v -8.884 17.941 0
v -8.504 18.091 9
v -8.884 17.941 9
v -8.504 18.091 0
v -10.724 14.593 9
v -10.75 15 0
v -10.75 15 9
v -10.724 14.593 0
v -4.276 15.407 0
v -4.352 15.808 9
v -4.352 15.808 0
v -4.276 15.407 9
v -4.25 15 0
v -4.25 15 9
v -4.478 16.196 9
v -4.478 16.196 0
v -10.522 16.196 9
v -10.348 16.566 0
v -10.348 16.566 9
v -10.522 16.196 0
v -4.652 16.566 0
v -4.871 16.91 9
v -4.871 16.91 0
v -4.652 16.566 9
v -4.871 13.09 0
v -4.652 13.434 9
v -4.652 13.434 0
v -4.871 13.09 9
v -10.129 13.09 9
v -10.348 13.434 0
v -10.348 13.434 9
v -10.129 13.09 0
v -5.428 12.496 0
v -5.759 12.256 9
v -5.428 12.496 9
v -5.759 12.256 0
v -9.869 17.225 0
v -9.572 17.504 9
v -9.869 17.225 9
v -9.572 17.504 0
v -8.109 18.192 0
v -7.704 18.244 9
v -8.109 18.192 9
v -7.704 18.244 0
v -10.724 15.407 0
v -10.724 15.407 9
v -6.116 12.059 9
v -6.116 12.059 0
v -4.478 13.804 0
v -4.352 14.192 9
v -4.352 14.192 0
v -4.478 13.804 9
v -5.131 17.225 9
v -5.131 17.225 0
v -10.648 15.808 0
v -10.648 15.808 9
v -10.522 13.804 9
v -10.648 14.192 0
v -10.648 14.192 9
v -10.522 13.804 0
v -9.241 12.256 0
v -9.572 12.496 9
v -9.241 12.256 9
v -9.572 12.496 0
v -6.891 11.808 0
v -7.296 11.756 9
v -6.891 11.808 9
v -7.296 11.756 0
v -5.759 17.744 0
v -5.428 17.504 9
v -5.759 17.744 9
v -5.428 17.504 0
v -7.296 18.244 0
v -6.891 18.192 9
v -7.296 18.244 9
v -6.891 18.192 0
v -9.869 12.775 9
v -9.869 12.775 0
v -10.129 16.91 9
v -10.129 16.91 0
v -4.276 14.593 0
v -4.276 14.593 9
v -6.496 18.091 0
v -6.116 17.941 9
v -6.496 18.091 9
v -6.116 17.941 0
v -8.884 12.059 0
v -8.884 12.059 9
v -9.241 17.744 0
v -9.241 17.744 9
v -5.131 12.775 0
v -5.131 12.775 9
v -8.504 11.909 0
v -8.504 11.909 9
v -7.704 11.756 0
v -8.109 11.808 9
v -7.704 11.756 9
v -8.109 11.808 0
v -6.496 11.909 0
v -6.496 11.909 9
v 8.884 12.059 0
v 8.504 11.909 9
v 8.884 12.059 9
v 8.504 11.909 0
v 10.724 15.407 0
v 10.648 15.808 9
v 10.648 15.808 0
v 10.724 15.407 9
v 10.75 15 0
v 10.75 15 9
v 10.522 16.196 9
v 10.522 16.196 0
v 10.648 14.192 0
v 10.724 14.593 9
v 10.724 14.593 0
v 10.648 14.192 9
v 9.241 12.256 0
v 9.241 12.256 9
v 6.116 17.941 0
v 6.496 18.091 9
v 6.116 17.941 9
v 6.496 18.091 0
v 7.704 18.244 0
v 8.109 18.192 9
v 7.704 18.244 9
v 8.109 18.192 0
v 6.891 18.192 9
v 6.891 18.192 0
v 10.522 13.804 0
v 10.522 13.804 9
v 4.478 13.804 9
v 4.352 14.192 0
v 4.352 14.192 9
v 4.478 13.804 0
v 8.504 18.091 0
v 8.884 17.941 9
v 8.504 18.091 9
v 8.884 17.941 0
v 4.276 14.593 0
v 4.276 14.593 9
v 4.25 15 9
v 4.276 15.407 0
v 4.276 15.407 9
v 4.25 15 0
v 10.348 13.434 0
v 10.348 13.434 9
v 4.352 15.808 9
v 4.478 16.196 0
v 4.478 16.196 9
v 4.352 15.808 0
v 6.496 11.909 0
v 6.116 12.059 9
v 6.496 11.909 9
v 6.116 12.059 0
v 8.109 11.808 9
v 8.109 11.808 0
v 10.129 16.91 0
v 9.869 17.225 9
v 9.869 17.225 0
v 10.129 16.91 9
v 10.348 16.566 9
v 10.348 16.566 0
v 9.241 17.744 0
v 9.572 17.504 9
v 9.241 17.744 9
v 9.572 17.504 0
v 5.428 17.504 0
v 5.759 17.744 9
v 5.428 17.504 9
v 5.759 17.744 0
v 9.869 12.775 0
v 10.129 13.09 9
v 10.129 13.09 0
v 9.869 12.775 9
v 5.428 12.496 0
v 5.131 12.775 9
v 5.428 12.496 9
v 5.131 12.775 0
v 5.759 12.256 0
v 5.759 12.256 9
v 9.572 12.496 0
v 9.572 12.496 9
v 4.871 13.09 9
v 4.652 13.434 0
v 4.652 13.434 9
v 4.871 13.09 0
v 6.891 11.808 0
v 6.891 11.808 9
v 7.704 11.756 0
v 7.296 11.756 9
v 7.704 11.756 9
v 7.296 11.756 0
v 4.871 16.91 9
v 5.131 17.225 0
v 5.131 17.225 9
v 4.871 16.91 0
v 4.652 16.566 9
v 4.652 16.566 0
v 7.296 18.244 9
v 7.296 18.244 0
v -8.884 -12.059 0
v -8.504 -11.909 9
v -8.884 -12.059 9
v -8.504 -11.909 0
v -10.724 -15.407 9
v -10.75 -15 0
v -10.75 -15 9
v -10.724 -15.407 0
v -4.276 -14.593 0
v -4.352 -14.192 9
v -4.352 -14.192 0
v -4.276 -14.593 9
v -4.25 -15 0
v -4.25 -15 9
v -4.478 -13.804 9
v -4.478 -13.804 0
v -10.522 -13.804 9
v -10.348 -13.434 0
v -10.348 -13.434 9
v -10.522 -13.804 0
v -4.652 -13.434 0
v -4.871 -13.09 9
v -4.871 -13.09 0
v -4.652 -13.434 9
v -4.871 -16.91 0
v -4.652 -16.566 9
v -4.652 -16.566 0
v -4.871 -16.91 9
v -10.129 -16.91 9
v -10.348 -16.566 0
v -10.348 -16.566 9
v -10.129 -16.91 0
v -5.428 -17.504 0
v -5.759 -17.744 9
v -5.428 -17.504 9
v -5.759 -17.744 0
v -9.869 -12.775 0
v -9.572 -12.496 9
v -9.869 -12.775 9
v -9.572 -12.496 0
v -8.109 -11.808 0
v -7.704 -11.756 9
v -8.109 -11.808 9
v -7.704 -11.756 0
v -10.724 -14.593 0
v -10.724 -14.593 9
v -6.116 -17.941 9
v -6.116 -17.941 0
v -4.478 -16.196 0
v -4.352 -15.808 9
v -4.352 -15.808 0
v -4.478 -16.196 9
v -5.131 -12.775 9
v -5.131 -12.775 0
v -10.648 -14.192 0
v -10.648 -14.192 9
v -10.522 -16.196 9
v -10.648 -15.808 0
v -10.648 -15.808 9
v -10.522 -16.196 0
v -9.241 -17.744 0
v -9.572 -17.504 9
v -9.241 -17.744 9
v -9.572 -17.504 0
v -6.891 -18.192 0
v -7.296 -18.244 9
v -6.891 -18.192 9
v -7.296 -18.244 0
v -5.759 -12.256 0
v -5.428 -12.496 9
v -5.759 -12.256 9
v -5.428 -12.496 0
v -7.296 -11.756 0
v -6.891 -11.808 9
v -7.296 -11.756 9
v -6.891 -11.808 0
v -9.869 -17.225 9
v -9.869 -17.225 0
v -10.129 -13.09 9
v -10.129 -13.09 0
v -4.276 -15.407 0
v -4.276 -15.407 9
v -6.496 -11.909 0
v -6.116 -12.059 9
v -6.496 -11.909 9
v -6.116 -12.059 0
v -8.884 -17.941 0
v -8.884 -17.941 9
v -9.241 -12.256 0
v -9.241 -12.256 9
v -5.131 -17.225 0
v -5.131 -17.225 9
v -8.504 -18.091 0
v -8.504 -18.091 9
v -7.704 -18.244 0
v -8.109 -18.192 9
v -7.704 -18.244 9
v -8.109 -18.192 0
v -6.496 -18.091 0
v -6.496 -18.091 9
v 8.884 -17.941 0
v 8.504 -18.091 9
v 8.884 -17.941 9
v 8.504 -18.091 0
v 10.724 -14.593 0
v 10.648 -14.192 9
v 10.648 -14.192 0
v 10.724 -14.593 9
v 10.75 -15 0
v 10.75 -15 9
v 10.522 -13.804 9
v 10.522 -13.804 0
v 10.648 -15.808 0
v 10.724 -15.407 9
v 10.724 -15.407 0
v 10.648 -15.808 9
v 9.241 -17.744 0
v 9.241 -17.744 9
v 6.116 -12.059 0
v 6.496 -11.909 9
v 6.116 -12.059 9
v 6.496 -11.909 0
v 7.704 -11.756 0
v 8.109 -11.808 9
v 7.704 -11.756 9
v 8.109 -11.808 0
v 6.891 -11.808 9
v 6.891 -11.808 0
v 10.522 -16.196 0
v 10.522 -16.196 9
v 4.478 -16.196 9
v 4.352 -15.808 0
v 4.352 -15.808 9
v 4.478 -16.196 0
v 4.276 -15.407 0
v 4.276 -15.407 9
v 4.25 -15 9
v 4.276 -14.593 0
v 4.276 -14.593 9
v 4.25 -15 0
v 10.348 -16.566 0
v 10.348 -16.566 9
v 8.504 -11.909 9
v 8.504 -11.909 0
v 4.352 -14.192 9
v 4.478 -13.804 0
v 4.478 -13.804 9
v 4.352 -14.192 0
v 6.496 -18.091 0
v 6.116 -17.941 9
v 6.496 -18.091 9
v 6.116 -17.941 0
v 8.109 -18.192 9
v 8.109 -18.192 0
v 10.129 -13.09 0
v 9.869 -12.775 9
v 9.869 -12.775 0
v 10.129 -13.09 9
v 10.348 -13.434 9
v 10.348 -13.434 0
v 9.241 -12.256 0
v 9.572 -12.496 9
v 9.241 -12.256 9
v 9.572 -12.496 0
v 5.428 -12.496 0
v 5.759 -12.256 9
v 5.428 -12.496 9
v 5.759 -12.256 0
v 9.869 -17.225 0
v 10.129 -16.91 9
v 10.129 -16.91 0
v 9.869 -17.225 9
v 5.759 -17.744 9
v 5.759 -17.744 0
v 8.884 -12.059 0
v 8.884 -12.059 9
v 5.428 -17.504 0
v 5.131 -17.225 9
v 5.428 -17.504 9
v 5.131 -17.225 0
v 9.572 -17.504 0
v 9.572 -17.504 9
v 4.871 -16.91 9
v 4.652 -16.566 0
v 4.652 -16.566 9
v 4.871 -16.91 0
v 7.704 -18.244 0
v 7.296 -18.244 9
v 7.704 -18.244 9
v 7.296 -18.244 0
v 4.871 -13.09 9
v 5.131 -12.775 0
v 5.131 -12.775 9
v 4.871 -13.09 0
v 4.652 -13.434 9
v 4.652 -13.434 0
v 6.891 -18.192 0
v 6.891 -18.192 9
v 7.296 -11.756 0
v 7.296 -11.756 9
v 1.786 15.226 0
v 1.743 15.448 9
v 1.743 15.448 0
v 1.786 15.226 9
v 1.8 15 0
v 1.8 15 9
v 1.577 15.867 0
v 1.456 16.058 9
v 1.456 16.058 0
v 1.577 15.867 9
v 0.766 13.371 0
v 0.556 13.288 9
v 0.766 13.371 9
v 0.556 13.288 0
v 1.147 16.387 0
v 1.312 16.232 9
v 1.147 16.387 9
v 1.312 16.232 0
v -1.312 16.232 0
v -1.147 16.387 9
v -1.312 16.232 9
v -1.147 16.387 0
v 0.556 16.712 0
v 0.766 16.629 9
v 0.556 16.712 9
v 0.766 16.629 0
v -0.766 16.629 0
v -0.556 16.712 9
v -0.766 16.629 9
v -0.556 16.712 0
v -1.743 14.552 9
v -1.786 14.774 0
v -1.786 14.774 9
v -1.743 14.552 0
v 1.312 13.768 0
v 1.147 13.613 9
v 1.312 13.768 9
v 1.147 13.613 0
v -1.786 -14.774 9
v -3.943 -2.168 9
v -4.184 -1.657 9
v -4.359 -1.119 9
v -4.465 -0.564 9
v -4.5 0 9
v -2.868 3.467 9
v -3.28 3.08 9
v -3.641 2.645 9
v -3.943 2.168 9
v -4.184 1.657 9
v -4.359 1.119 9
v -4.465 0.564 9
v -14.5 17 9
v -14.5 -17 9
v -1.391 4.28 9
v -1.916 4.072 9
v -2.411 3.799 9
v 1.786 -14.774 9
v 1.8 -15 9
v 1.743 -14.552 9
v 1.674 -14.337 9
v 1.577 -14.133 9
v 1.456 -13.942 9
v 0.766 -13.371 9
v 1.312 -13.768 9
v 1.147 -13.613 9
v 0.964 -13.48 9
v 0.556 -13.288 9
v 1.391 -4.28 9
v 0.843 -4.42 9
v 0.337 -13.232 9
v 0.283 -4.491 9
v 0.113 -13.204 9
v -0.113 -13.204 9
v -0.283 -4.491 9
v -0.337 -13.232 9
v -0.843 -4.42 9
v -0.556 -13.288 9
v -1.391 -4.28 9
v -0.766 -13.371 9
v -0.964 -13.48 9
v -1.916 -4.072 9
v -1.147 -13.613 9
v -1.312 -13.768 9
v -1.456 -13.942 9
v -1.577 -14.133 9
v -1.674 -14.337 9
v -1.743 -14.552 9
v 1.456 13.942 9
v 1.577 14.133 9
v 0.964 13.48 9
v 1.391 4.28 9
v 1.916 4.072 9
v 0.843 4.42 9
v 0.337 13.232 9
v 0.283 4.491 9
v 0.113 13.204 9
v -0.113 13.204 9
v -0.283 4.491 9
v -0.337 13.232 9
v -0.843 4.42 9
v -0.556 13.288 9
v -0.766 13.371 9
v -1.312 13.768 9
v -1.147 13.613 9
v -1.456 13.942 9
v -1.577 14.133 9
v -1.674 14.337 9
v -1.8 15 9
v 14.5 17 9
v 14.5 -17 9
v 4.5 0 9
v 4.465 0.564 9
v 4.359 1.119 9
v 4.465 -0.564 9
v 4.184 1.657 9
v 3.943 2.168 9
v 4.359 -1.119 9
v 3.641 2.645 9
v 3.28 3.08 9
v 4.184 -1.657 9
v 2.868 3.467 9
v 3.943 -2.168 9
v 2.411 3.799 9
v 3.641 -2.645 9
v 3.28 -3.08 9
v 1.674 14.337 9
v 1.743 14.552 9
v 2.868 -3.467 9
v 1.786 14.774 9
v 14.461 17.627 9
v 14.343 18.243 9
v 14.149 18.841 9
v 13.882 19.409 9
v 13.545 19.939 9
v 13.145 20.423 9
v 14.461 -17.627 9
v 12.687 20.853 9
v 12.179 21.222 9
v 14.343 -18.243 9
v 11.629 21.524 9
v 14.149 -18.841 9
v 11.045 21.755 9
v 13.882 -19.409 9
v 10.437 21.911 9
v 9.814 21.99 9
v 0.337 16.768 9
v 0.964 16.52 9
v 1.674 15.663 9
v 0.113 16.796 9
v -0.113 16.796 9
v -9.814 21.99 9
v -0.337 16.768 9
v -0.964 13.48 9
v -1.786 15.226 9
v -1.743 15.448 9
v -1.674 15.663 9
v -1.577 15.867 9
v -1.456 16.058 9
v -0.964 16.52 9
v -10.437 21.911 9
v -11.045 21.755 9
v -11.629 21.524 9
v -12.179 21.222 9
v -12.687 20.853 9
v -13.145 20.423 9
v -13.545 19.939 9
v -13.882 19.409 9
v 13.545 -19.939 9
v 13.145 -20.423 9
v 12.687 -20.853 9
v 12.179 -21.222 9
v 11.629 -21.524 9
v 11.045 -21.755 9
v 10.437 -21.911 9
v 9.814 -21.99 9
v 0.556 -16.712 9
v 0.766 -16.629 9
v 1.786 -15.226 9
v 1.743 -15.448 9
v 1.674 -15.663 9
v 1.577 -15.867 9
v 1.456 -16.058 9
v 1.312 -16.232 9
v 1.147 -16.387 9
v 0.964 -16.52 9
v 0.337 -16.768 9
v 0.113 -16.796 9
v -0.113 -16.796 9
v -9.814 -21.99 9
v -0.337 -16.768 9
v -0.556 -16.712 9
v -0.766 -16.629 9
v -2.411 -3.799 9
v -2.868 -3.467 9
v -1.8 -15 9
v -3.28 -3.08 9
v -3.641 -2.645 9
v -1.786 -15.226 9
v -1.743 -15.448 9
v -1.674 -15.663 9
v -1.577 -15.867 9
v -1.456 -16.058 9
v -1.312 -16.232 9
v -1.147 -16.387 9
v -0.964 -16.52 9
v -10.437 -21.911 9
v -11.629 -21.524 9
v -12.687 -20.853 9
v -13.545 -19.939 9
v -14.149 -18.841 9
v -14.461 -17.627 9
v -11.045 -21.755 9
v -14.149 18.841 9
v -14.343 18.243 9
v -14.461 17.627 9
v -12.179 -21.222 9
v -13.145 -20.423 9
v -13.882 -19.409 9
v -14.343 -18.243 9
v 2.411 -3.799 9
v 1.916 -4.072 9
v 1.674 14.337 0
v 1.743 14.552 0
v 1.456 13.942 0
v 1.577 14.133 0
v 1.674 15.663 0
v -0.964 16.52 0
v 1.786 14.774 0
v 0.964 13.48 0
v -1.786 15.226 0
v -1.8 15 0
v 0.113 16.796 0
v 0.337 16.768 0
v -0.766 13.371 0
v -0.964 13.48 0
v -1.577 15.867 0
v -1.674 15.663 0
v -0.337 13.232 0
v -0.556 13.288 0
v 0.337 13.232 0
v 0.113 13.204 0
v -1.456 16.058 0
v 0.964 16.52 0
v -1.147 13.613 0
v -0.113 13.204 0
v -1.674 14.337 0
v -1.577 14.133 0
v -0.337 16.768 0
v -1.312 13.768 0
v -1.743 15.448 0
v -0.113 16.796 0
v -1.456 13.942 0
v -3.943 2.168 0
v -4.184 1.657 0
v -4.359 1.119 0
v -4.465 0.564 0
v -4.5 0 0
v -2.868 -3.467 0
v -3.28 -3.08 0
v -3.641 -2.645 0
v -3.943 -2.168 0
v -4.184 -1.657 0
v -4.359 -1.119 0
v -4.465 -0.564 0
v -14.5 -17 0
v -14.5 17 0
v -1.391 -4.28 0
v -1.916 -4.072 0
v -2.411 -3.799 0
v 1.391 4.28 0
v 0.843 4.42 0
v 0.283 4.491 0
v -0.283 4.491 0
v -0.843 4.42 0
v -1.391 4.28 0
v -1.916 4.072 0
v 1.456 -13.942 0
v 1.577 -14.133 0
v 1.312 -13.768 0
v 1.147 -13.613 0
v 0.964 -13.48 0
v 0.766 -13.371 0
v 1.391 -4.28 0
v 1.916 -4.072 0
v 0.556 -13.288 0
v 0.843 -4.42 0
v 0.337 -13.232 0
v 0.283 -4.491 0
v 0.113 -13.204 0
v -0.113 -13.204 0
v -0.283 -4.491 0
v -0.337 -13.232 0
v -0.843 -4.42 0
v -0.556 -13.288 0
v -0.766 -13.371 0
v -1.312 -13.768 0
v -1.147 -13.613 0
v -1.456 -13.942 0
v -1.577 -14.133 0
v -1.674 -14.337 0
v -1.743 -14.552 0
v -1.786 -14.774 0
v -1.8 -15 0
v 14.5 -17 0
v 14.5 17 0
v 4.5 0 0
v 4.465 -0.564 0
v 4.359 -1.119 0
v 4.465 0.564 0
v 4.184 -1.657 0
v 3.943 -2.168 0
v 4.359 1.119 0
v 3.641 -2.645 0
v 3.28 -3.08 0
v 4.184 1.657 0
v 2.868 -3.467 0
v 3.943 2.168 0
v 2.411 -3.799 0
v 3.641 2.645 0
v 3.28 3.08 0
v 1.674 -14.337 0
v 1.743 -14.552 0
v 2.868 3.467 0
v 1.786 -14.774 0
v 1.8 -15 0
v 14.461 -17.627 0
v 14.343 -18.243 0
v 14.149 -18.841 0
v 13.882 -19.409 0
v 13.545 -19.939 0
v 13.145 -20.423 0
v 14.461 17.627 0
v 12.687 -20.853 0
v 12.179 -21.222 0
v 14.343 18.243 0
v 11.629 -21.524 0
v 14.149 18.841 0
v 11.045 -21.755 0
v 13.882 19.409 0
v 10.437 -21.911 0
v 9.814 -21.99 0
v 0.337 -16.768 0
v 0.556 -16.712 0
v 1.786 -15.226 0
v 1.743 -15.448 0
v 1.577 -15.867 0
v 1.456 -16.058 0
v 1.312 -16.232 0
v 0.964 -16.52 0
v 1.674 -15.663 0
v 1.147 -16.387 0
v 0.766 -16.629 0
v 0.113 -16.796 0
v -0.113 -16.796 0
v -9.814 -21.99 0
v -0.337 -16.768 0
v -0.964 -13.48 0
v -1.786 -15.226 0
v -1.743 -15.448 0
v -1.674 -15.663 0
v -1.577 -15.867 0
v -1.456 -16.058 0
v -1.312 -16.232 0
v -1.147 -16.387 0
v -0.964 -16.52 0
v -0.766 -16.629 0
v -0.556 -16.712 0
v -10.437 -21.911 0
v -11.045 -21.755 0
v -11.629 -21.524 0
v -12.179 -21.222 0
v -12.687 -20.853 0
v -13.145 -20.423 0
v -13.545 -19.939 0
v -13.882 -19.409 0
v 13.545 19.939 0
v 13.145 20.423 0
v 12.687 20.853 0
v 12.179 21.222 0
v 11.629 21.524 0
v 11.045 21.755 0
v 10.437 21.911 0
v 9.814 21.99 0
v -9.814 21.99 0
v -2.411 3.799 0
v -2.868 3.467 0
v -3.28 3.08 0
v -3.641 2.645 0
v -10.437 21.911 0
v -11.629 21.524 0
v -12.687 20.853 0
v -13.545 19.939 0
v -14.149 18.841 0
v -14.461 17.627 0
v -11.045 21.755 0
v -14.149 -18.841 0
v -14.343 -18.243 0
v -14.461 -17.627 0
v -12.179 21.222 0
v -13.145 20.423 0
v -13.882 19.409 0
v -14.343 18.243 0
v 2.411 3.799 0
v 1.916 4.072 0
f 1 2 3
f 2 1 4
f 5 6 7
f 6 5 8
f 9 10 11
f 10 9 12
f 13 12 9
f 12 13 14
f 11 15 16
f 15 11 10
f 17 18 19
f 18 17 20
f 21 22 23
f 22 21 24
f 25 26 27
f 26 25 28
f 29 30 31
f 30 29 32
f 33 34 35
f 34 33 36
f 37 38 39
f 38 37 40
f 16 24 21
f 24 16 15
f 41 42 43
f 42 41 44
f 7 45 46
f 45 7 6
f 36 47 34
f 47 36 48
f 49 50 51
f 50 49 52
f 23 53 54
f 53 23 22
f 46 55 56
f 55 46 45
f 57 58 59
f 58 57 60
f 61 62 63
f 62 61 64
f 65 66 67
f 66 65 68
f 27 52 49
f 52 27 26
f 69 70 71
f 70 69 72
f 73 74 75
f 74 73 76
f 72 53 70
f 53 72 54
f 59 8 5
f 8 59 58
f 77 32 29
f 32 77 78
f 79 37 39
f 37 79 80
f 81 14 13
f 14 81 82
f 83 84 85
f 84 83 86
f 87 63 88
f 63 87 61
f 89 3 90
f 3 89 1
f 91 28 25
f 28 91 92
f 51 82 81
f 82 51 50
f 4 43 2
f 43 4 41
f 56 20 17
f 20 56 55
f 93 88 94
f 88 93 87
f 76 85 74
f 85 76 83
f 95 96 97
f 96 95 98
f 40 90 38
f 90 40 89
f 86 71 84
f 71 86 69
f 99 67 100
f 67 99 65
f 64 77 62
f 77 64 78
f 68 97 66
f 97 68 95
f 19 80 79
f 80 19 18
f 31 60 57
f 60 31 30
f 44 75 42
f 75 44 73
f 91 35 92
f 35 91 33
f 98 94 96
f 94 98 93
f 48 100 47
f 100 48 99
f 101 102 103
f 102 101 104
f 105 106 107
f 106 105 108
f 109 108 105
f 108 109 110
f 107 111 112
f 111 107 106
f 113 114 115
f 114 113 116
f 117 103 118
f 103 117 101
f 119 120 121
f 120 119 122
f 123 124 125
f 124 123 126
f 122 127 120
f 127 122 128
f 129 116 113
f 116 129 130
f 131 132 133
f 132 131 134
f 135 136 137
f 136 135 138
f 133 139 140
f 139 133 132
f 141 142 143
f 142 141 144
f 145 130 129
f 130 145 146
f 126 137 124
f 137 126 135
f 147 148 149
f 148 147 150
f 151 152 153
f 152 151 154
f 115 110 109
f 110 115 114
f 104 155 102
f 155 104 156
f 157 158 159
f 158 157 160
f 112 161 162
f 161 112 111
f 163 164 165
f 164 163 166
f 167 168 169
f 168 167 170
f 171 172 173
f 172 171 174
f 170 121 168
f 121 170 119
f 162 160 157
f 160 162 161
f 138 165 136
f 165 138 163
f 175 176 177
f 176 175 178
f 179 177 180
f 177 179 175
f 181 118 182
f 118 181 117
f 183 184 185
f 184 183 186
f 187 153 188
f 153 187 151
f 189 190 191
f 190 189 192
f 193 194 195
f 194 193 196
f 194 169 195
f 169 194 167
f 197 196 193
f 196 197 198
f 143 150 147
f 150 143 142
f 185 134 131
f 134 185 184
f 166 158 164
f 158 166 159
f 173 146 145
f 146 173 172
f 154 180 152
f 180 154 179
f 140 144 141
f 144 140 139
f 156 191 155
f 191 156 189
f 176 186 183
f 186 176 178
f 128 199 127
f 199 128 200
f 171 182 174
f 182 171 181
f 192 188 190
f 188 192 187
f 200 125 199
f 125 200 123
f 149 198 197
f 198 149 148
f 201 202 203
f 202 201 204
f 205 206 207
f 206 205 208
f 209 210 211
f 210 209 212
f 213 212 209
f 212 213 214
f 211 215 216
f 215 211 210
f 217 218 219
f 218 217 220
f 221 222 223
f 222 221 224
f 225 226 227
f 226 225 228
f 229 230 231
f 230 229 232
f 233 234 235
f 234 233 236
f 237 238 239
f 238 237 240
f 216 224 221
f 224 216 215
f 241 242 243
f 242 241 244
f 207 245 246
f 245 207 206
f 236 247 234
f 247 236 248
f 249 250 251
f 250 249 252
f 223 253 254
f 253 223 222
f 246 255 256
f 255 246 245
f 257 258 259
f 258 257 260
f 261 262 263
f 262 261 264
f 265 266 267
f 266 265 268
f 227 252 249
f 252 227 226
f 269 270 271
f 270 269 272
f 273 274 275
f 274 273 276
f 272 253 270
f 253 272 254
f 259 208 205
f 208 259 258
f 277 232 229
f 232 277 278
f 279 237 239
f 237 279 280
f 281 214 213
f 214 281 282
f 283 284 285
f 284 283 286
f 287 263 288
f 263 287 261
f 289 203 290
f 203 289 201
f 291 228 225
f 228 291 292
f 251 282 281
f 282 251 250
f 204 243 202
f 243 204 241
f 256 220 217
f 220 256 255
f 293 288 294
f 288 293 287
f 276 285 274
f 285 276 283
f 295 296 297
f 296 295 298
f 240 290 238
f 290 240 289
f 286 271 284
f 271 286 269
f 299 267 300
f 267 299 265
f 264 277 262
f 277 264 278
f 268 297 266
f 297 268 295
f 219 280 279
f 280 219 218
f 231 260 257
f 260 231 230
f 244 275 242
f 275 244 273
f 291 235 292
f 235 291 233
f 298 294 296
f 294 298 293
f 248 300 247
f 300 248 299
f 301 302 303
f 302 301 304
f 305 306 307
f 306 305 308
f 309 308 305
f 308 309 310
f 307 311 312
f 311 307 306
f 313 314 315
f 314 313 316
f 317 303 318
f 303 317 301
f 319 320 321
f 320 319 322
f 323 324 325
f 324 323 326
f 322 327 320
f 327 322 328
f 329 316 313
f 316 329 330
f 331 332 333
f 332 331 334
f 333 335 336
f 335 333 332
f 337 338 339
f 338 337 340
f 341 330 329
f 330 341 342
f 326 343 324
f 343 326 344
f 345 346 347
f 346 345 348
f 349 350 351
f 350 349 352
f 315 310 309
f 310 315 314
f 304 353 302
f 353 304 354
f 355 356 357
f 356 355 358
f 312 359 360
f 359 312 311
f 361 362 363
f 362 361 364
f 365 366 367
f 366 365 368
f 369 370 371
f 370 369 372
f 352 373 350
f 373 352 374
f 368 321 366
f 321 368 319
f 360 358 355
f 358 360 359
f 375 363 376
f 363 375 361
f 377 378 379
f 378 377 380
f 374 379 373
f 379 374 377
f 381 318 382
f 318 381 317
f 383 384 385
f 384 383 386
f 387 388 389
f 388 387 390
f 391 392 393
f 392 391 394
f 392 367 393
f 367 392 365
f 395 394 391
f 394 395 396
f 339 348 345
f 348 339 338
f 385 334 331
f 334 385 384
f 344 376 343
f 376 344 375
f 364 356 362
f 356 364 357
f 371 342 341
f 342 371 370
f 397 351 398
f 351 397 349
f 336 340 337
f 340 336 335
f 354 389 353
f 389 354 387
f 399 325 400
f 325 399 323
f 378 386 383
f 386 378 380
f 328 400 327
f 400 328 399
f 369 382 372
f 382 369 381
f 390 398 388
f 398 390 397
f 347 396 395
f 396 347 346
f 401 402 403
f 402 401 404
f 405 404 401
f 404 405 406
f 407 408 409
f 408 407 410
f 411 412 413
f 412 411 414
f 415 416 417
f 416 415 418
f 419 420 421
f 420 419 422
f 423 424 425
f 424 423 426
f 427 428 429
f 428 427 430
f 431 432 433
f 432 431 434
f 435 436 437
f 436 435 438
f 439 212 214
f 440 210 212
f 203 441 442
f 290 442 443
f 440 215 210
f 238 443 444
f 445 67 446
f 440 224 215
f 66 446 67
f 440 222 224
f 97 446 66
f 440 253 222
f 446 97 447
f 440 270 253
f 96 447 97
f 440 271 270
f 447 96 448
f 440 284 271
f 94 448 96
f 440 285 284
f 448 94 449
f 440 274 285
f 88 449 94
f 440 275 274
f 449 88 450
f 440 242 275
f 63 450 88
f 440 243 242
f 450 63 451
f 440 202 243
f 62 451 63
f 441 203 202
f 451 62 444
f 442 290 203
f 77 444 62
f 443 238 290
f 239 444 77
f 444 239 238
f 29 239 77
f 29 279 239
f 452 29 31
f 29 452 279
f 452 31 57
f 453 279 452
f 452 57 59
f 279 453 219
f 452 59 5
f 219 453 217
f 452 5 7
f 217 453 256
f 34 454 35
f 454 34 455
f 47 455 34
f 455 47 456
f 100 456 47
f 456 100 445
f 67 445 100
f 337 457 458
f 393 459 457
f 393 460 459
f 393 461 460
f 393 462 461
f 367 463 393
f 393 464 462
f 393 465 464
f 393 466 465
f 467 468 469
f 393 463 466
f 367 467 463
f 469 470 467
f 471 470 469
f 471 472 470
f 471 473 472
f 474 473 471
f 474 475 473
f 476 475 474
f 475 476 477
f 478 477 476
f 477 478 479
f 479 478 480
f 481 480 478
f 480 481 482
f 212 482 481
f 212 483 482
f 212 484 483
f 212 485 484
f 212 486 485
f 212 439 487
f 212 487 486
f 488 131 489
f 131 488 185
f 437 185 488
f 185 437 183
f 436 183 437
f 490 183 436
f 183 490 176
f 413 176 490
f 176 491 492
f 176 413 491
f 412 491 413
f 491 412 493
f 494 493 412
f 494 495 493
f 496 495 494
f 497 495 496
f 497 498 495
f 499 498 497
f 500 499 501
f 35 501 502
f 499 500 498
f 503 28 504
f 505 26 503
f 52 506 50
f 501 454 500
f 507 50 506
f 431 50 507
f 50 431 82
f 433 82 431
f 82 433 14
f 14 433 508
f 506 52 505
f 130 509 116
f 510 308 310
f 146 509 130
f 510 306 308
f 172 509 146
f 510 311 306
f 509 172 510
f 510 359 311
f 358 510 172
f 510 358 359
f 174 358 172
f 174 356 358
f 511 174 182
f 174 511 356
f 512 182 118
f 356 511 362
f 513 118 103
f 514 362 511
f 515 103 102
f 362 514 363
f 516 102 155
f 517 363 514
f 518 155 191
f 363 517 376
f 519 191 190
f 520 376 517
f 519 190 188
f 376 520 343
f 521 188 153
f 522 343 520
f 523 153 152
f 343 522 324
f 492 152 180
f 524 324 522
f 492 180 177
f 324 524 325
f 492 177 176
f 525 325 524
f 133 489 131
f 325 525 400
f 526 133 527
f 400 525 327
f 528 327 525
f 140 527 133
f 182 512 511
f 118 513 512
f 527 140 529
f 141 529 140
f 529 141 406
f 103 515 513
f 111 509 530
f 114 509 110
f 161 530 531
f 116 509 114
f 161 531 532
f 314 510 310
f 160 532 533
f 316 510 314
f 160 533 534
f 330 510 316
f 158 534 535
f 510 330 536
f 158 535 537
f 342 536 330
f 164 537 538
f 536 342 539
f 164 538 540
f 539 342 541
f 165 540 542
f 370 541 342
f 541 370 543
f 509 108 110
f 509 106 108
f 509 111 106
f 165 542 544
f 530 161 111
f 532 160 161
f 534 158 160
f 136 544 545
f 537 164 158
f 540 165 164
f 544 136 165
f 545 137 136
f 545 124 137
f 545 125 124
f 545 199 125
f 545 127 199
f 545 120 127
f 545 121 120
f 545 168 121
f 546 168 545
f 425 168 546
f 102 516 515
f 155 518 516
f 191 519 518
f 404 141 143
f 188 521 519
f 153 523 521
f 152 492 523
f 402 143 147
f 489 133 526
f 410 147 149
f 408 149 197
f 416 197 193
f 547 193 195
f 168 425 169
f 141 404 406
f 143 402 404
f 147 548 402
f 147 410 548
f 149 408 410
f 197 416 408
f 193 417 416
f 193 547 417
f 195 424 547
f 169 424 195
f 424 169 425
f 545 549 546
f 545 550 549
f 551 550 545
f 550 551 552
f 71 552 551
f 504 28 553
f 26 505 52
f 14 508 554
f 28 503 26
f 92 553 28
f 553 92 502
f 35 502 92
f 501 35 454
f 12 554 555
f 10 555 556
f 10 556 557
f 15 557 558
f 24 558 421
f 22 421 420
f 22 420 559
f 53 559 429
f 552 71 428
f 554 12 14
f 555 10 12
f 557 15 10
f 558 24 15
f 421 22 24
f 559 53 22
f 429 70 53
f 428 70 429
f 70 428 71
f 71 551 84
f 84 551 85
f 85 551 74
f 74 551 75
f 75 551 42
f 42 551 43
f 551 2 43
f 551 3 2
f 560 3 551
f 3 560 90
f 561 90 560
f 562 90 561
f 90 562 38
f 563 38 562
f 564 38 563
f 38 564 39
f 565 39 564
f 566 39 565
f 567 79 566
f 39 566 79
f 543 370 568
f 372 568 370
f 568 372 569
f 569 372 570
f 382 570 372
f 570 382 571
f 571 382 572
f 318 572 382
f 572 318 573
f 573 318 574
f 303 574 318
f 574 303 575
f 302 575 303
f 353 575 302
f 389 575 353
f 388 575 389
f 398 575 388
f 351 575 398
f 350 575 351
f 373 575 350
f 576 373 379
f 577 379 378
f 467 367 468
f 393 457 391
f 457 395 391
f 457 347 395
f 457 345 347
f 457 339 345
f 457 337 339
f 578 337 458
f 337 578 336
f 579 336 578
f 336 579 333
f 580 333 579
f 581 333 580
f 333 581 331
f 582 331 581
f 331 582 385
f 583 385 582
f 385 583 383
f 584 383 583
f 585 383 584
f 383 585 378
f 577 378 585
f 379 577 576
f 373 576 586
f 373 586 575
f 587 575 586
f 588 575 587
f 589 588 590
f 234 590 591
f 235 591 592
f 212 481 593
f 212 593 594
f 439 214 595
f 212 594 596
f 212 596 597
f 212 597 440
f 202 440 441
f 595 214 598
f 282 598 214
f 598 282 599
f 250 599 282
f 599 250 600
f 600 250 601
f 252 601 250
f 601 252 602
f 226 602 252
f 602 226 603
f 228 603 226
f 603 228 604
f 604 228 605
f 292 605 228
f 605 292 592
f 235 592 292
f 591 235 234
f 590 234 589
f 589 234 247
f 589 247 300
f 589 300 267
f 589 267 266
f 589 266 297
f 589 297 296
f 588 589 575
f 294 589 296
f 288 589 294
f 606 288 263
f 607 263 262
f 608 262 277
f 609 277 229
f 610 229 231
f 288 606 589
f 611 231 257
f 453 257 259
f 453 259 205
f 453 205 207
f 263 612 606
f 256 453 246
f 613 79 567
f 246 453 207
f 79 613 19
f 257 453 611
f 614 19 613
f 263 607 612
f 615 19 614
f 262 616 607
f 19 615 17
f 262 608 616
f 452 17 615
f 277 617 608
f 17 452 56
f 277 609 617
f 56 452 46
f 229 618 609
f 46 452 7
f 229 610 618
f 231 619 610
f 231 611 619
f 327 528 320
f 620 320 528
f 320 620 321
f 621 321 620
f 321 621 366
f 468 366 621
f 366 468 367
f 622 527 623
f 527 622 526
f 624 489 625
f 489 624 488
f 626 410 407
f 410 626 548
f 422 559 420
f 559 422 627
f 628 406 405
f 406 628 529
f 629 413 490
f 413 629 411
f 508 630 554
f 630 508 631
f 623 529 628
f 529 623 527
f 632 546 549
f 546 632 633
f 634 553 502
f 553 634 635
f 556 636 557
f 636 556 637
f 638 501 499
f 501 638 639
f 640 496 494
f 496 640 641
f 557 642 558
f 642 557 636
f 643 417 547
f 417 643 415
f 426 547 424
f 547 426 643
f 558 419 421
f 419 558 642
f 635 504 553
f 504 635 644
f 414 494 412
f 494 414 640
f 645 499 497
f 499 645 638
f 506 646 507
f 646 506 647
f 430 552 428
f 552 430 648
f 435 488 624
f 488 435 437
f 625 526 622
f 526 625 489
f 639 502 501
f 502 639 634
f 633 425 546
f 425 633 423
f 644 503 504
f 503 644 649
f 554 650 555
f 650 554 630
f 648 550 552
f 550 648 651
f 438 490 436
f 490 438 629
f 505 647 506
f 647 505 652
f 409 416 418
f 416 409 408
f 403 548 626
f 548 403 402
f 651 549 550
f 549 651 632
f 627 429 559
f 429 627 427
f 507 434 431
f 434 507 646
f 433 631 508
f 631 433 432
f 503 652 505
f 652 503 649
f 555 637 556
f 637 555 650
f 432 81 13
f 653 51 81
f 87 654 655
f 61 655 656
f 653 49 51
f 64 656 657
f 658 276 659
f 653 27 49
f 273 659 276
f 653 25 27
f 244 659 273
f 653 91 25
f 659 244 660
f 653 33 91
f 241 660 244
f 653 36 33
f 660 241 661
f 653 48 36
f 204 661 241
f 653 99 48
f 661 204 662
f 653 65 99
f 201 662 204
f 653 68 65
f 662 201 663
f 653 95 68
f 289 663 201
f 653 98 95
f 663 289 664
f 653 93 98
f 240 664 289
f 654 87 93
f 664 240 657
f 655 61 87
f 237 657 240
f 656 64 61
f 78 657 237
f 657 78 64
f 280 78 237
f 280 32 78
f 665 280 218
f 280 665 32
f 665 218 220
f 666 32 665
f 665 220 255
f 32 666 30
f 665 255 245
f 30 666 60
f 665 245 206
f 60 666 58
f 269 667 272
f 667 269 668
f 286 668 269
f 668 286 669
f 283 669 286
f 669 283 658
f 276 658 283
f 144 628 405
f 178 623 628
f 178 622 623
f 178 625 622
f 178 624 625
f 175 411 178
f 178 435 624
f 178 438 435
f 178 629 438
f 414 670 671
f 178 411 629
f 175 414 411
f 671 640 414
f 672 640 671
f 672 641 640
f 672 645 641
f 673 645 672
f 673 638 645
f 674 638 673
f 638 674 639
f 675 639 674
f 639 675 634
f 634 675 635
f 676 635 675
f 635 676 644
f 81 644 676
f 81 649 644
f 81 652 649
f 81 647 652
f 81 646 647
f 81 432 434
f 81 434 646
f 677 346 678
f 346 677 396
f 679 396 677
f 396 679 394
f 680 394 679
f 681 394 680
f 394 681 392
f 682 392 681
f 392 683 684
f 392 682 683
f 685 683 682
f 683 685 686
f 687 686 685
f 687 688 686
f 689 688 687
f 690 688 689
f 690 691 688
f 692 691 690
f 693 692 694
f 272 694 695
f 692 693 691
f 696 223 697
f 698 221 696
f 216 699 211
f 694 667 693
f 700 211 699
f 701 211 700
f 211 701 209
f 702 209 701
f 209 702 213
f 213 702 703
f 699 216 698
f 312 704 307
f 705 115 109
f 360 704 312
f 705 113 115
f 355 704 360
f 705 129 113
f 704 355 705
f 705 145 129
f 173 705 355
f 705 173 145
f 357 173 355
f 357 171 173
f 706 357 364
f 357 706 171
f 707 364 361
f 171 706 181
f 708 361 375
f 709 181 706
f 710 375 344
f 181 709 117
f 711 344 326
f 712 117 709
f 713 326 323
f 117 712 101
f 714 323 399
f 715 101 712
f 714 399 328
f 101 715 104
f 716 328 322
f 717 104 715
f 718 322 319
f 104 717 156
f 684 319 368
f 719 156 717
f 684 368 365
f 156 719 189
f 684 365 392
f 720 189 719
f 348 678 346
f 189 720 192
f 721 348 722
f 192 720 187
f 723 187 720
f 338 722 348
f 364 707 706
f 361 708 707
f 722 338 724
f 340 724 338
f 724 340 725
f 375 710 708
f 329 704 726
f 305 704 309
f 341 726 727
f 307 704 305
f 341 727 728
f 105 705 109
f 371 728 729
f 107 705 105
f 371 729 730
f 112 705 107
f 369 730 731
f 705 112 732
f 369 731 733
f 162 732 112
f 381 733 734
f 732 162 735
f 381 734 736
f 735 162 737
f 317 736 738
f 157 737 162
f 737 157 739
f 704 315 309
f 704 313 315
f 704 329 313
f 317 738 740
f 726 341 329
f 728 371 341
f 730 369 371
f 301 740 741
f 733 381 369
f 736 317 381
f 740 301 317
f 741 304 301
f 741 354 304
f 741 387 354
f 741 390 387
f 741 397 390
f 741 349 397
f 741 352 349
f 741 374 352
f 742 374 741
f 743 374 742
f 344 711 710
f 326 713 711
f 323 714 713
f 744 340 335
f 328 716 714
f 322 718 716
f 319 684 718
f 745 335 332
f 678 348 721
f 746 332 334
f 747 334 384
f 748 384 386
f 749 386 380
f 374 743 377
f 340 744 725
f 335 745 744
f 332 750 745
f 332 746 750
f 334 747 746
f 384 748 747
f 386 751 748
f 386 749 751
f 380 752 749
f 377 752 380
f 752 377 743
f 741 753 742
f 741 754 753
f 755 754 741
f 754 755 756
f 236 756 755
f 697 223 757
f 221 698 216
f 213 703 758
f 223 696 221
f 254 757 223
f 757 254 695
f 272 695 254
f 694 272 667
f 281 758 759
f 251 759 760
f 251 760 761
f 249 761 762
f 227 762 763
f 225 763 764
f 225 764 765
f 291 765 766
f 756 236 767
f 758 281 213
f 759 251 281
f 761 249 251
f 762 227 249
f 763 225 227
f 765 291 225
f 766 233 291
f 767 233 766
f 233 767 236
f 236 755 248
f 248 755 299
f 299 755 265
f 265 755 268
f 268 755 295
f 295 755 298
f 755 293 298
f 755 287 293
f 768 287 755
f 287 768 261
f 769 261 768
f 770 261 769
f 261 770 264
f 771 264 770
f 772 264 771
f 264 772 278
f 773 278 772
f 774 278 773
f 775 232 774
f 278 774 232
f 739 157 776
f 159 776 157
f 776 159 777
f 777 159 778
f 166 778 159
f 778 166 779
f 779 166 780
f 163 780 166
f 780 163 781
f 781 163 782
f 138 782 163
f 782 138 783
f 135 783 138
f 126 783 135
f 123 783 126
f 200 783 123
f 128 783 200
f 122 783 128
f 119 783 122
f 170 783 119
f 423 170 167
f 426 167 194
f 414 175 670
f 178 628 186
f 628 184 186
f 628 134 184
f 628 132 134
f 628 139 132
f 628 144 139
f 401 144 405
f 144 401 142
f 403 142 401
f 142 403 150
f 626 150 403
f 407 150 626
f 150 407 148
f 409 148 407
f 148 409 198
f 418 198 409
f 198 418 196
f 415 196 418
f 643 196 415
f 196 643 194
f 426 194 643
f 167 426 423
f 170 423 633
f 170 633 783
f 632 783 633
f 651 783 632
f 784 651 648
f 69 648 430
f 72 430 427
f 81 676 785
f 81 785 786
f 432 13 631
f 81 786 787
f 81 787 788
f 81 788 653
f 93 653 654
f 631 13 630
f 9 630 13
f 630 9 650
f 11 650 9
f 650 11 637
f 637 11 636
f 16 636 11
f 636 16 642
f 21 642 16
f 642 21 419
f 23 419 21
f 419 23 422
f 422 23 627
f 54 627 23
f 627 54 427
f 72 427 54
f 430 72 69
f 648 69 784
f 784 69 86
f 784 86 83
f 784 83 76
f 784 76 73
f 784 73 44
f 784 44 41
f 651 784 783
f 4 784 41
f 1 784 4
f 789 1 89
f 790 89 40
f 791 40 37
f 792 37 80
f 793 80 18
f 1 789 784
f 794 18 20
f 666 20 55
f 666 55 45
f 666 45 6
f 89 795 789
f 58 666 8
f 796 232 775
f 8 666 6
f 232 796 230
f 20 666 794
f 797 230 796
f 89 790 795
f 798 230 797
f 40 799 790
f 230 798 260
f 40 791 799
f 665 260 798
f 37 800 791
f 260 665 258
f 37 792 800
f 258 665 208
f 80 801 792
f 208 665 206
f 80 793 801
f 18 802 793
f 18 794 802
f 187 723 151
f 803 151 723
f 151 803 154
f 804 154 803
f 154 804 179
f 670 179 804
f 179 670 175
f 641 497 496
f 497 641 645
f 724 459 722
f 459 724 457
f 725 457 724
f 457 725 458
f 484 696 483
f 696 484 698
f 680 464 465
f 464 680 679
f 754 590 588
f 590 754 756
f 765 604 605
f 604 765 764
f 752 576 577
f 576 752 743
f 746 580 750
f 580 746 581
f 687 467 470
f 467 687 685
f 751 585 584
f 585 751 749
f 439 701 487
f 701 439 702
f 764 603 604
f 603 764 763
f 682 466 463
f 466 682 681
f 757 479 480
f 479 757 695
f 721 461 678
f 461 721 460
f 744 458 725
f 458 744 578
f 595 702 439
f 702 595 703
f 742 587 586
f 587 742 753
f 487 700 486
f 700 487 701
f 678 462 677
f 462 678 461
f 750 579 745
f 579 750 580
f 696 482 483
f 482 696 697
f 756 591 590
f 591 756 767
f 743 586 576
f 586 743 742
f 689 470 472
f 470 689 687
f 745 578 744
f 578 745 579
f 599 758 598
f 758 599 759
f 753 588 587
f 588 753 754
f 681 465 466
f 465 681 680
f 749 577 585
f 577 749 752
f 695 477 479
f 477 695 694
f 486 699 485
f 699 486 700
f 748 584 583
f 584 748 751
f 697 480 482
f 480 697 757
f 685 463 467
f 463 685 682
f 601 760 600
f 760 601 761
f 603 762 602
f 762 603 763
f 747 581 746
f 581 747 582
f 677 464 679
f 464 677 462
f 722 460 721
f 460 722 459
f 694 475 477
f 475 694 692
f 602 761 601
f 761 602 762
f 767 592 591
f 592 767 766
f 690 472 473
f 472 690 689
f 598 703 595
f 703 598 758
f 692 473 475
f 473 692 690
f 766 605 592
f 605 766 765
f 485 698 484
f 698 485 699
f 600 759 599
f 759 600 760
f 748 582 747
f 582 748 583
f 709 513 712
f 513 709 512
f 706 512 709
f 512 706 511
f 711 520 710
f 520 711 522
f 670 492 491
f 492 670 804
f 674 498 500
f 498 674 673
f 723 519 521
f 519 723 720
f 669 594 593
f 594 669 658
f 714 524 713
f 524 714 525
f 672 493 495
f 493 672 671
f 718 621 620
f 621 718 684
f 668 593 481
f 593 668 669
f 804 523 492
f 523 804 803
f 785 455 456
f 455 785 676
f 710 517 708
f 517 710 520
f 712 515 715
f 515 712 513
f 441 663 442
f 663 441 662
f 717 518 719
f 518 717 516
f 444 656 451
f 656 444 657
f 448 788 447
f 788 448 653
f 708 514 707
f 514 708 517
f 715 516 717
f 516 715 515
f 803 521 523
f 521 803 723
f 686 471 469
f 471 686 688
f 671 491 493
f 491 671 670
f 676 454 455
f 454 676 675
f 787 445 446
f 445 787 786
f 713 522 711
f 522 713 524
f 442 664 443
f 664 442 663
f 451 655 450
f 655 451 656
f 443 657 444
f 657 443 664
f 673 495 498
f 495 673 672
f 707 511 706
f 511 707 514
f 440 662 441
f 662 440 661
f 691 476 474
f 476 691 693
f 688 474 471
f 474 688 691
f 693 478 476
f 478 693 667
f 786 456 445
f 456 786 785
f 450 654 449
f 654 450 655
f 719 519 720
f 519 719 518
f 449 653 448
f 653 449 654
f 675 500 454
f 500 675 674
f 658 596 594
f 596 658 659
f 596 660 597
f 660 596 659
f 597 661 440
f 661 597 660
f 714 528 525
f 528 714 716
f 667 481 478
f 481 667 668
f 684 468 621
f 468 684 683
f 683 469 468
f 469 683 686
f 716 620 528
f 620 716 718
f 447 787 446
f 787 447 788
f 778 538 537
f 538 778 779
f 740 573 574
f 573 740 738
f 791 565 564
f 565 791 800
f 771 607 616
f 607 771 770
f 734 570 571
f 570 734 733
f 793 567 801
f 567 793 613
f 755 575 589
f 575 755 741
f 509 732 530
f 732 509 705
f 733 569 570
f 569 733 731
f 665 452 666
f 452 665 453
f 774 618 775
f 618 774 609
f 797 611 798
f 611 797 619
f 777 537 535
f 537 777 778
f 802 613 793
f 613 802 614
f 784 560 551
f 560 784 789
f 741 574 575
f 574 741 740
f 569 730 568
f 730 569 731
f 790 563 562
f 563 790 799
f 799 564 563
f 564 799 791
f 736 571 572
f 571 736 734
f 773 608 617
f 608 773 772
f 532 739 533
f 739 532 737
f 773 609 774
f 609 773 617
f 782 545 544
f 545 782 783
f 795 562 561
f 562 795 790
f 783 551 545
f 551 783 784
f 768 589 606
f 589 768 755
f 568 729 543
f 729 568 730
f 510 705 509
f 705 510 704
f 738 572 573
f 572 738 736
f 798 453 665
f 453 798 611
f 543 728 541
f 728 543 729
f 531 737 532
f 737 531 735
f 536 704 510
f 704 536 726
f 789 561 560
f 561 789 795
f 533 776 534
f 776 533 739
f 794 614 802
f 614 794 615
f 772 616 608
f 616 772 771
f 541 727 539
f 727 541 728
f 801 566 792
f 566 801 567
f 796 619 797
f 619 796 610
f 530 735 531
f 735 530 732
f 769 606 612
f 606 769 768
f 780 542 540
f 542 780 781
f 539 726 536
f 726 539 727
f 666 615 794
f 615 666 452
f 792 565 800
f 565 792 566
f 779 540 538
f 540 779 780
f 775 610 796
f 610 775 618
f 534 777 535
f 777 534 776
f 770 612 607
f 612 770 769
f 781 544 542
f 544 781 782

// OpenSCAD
$fn = 50;


difference() {
	union() {
		hull() {
			translate(v = [-9.5000000000, 17.0000000000, 0]) {
				cylinder(h = 9, r = 5);
			}
			translate(v = [9.5000000000, 17.0000000000, 0]) {
				cylinder(h = 9, r = 5);
			}
			translate(v = [-9.5000000000, -17.0000000000, 0]) {
				cylinder(h = 9, r = 5);
			}
			translate(v = [9.5000000000, -17.0000000000, 0]) {
				cylinder(h = 9, r = 5);
			}
		}
	}
	union() {
		#translate(v = [-7.5000000000, 15.0000000000, 0]) {
			cylinder(h = 9, r = 3.2500000000);
		}
		#translate(v = [7.5000000000, 15.0000000000, 0]) {
			cylinder(h = 9, r = 3.2500000000);
		}
		#translate(v = [-7.5000000000, -15.0000000000, 0]) {
			cylinder(h = 9, r = 3.2500000000);
		}
		#translate(v = [7.5000000000, -15.0000000000, 0]) {
			cylinder(h = 9, r = 3.2500000000);
		}
		#translate(v = [-7.5000000000, -15.0000000000, -100.0000000000]) {
			cylinder(h = 200, r = 3.2500000000);
		}
		#translate(v = [-7.5000000000, 15.0000000000, -100.0000000000]) {
			cylinder(h = 200, r = 3.2500000000);
		}
		#translate(v = [7.5000000000, -15.0000000000, -100.0000000000]) {
			cylinder(h = 200, r = 3.2500000000);
		}
		#translate(v = [7.5000000000, 15.0000000000, -100.0000000000]) {
			cylinder(h = 200, r = 3.2500000000);
		}
		#translate(v = [-7.5000000000, 15.0000000000, 0]) {
			cylinder(h = 9, r = 1.8000000000);
		}
		#translate(v = [0.0000000000, 15.0000000000, 0]) {
			cylinder(h = 9, r = 1.8000000000);
		}
		#translate(v = [7.5000000000, 15.0000000000, 0]) {
			cylinder(h = 9, r = 1.8000000000);
		}
		#translate(v = [-7.5000000000, -15.0000000000, 0]) {
			cylinder(h = 9, r = 1.8000000000);
		}
		#translate(v = [0.0000000000, -15.0000000000, 0]) {
			cylinder(h = 9, r = 1.8000000000);
		}
		#translate(v = [7.5000000000, -15.0000000000, 0]) {
			cylinder(h = 9, r = 1.8000000000);
		}
		#translate(v = [-7.5000000000, 15.0000000000, 0]) {
			cylinder(h = 9, r = 1.8000000000);
		}
		#translate(v = [0.0000000000, 15.0000000000, 0]) {
			cylinder(h = 9, r = 1.8000000000);
		}
		#translate(v = [7.5000000000, 15.0000000000, 0]) {
			cylinder(h = 9, r = 1.8000000000);
		}
		#translate(v = [-7.5000000000, -15.0000000000, 0]) {
			cylinder(h = 9, r = 1.8000000000);
		}
		#translate(v = [0.0000000000, -15.0000000000, 0]) {
			cylinder(h = 9, r = 1.8000000000);
		}
		#translate(v = [7.5000000000, -15.0000000000, 0]) {
			cylinder(h = 9, r = 1.8000000000);
		}
		#translate(v = [-7.5000000000, 15.0000000000, 0]) {
			cylinder(h = 9, r = 1.8000000000);
		}
		#translate(v = [0.0000000000, 15.0000000000, 0]) {
			cylinder(h = 9, r = 1.8000000000);
		}
		#translate(v = [7.5000000000, 15.0000000000, 0]) {
			cylinder(h = 9, r = 1.8000000000);
		}
		#translate(v = [-7.5000000000, -15.0000000000, 0]) {
			cylinder(h = 9, r = 1.8000000000);
		}
		#translate(v = [0.0000000000, -15.0000000000, 0]) {
			cylinder(h = 9, r = 1.8000000000);
		}
		#translate(v = [7.5000000000, -15.0000000000, 0]) {
			cylinder(h = 9, r = 1.8000000000);
		}
		#cylinder(h = 9, r = 4.5000000000);
	}
}
